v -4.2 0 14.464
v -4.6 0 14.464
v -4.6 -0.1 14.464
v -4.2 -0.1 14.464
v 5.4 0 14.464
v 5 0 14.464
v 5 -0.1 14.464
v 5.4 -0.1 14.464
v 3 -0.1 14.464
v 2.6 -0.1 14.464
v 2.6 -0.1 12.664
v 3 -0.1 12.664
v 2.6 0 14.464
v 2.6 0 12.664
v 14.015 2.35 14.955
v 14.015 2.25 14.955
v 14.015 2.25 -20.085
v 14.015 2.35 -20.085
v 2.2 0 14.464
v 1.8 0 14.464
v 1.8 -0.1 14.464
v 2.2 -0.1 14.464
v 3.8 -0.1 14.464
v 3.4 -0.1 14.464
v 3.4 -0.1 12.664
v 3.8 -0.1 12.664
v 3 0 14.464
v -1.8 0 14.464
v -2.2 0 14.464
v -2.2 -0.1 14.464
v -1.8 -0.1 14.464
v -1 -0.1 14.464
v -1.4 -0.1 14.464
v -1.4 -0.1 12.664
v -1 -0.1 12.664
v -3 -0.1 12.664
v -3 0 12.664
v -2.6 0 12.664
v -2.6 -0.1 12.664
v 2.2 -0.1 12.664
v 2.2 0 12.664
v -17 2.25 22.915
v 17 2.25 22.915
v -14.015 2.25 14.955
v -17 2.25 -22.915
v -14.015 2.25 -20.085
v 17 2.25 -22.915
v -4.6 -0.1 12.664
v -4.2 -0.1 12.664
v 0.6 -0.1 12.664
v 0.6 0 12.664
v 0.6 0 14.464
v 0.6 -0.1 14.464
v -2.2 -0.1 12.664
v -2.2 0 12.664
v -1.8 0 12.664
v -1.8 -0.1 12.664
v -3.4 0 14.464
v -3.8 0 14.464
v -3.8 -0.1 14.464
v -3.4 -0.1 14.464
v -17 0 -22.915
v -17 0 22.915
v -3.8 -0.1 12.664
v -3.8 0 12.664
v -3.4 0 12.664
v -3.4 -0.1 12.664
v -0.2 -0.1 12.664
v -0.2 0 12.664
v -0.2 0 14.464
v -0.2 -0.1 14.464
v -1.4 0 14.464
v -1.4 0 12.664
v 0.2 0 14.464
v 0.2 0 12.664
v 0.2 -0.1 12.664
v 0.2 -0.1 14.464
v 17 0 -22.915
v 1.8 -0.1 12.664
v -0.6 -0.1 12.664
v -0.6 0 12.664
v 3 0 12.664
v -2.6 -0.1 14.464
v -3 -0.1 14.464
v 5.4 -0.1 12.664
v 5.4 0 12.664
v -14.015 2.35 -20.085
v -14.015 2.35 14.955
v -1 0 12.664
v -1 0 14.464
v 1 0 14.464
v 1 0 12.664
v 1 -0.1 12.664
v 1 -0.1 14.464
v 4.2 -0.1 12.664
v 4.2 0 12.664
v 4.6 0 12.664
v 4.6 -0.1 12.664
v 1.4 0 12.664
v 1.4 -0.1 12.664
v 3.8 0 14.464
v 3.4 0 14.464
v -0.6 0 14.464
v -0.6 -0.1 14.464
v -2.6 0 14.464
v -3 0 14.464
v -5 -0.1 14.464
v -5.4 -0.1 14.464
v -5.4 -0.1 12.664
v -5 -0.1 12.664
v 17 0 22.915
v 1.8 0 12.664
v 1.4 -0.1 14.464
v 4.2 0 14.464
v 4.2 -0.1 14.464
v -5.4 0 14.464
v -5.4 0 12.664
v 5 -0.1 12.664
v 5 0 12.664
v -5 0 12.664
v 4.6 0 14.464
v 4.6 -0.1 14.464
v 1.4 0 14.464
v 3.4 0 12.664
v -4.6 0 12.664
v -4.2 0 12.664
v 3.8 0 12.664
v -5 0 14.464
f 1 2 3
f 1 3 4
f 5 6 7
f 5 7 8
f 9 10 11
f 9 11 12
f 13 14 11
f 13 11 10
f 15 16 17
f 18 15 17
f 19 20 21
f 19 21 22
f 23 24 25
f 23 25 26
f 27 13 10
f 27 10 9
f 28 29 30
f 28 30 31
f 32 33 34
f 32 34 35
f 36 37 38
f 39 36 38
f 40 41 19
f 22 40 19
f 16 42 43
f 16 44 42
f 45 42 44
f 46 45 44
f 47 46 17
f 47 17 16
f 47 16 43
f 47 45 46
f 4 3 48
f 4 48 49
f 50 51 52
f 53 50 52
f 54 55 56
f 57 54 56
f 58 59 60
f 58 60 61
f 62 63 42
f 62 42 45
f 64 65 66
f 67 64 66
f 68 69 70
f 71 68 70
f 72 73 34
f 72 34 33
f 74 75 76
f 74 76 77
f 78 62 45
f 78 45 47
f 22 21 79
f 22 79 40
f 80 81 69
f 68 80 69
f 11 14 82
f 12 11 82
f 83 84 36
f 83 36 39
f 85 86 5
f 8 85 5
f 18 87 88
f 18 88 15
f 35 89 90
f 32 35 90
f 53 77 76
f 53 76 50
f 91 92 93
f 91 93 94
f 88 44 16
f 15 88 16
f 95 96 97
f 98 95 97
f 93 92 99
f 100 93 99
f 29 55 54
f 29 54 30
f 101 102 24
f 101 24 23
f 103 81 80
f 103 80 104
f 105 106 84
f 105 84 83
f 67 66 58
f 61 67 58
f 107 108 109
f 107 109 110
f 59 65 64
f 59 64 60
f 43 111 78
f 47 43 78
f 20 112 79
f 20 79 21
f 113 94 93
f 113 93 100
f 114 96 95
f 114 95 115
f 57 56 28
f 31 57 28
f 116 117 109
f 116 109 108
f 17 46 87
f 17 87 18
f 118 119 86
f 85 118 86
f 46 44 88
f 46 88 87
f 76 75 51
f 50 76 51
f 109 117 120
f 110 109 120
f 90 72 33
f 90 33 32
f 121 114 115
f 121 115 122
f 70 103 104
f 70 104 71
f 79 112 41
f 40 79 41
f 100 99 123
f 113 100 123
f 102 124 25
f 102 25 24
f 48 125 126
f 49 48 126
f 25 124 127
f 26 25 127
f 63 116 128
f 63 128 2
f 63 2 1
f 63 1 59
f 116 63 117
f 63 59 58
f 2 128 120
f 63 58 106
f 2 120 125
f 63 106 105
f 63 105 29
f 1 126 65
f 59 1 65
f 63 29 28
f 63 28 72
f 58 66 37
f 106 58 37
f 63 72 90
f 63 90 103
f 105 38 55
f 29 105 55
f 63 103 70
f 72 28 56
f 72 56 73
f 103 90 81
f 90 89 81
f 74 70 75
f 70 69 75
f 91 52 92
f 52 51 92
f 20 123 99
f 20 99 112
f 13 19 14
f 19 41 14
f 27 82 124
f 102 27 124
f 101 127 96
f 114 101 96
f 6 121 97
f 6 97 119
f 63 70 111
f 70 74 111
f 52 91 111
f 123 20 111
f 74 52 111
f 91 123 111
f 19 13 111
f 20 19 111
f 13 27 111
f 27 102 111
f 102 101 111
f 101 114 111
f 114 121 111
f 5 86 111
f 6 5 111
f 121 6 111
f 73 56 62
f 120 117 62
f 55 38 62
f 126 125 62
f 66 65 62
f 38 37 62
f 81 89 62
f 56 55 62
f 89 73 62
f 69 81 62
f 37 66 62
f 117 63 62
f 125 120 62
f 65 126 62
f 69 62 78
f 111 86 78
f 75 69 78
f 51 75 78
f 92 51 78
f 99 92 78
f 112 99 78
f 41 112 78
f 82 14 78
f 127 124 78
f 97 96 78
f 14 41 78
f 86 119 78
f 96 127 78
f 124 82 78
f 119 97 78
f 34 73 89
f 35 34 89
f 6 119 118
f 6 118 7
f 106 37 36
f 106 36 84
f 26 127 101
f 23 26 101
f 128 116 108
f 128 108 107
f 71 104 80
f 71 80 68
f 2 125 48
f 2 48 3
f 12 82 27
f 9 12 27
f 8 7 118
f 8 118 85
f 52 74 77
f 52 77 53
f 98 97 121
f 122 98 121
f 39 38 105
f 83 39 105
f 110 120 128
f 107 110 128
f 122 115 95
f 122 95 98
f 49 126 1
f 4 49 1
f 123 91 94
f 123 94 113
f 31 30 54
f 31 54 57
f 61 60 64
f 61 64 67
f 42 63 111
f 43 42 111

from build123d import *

# Parameters (mm, degrees)
SKETCH_1_W      = 34
SKETCH_1_H      = 45.83
EXTRUDE_1_DEPTH = 2.25
SKETCH_2_W      = 28.03
SKETCH_2_H      = 35.04
EXTRUDE_2_DEPTH = 0.1
SKETCH_4_W      = 0.4
SKETCH_4_H      = 1.8
EXTRUDE_3_DEPTH = 0.1


with BuildPart() as part:
    # Эскиз1 → Бобышка-Вытянуть1 (new body)
    with BuildSketch(Plane(origin=(0, 0, 0), x_dir=(1, 0, 0), z_dir=(0, 1, 0))):
        Rectangle(SKETCH_1_W, SKETCH_1_H)
    extrude(amount=EXTRUDE_1_DEPTH)

    # Эскиз2 → Бобышка-Вытянуть2 (add)
    with BuildSketch(Plane(origin=(0, 2.25, 0), x_dir=(1, 0, 0), z_dir=(0, 1, 0))):
        with Locations((0, 2.565)):
            Rectangle(SKETCH_2_W, SKETCH_2_H)
    extrude(amount=EXTRUDE_2_DEPTH)

    # Эскиз4 → Бобышка-Вытянуть3 (add)
    with BuildSketch(Plane.XZ):
        with Locations((-4.4, 13.564176084)):
            Rectangle(SKETCH_4_W, SKETCH_4_H)
        with Locations((-5.2, 13.564176084)):
            Rectangle(SKETCH_4_W, SKETCH_4_H)
        with Locations((-3.6, 13.564176084)):
            Rectangle(SKETCH_4_W, SKETCH_4_H)
        with Locations((-2.8, 13.564176084)):
            Rectangle(SKETCH_4_W, SKETCH_4_H)
        with Locations((-2, 13.564176084)):
            Rectangle(SKETCH_4_W, SKETCH_4_H)
        with Locations((-1.2, 13.564176084)):
            Rectangle(SKETCH_4_W, SKETCH_4_H)
        with Locations((-0.4, 13.564176084)):
            Rectangle(SKETCH_4_W, SKETCH_4_H)
        with Locations((0.4, 13.564176084)):
            Rectangle(SKETCH_4_W, SKETCH_4_H)
        with Locations((1.2, 13.564176084)):
            Rectangle(SKETCH_4_W, SKETCH_4_H)
        with Locations((2, 13.564176084)):
            Rectangle(SKETCH_4_W, SKETCH_4_H)
        with Locations((2.8, 13.564176084)):
            Rectangle(SKETCH_4_W, SKETCH_4_H)
        with Locations((3.6, 13.564176084)):
            Rectangle(SKETCH_4_W, SKETCH_4_H)
        with Locations((4.4, 13.564176084)):
            Rectangle(SKETCH_4_W, SKETCH_4_H)
        with Locations((5.2, 13.564176084)):
            Rectangle(SKETCH_4_W, SKETCH_4_H)
    extrude(amount=EXTRUDE_3_DEPTH)


solid = part.part
